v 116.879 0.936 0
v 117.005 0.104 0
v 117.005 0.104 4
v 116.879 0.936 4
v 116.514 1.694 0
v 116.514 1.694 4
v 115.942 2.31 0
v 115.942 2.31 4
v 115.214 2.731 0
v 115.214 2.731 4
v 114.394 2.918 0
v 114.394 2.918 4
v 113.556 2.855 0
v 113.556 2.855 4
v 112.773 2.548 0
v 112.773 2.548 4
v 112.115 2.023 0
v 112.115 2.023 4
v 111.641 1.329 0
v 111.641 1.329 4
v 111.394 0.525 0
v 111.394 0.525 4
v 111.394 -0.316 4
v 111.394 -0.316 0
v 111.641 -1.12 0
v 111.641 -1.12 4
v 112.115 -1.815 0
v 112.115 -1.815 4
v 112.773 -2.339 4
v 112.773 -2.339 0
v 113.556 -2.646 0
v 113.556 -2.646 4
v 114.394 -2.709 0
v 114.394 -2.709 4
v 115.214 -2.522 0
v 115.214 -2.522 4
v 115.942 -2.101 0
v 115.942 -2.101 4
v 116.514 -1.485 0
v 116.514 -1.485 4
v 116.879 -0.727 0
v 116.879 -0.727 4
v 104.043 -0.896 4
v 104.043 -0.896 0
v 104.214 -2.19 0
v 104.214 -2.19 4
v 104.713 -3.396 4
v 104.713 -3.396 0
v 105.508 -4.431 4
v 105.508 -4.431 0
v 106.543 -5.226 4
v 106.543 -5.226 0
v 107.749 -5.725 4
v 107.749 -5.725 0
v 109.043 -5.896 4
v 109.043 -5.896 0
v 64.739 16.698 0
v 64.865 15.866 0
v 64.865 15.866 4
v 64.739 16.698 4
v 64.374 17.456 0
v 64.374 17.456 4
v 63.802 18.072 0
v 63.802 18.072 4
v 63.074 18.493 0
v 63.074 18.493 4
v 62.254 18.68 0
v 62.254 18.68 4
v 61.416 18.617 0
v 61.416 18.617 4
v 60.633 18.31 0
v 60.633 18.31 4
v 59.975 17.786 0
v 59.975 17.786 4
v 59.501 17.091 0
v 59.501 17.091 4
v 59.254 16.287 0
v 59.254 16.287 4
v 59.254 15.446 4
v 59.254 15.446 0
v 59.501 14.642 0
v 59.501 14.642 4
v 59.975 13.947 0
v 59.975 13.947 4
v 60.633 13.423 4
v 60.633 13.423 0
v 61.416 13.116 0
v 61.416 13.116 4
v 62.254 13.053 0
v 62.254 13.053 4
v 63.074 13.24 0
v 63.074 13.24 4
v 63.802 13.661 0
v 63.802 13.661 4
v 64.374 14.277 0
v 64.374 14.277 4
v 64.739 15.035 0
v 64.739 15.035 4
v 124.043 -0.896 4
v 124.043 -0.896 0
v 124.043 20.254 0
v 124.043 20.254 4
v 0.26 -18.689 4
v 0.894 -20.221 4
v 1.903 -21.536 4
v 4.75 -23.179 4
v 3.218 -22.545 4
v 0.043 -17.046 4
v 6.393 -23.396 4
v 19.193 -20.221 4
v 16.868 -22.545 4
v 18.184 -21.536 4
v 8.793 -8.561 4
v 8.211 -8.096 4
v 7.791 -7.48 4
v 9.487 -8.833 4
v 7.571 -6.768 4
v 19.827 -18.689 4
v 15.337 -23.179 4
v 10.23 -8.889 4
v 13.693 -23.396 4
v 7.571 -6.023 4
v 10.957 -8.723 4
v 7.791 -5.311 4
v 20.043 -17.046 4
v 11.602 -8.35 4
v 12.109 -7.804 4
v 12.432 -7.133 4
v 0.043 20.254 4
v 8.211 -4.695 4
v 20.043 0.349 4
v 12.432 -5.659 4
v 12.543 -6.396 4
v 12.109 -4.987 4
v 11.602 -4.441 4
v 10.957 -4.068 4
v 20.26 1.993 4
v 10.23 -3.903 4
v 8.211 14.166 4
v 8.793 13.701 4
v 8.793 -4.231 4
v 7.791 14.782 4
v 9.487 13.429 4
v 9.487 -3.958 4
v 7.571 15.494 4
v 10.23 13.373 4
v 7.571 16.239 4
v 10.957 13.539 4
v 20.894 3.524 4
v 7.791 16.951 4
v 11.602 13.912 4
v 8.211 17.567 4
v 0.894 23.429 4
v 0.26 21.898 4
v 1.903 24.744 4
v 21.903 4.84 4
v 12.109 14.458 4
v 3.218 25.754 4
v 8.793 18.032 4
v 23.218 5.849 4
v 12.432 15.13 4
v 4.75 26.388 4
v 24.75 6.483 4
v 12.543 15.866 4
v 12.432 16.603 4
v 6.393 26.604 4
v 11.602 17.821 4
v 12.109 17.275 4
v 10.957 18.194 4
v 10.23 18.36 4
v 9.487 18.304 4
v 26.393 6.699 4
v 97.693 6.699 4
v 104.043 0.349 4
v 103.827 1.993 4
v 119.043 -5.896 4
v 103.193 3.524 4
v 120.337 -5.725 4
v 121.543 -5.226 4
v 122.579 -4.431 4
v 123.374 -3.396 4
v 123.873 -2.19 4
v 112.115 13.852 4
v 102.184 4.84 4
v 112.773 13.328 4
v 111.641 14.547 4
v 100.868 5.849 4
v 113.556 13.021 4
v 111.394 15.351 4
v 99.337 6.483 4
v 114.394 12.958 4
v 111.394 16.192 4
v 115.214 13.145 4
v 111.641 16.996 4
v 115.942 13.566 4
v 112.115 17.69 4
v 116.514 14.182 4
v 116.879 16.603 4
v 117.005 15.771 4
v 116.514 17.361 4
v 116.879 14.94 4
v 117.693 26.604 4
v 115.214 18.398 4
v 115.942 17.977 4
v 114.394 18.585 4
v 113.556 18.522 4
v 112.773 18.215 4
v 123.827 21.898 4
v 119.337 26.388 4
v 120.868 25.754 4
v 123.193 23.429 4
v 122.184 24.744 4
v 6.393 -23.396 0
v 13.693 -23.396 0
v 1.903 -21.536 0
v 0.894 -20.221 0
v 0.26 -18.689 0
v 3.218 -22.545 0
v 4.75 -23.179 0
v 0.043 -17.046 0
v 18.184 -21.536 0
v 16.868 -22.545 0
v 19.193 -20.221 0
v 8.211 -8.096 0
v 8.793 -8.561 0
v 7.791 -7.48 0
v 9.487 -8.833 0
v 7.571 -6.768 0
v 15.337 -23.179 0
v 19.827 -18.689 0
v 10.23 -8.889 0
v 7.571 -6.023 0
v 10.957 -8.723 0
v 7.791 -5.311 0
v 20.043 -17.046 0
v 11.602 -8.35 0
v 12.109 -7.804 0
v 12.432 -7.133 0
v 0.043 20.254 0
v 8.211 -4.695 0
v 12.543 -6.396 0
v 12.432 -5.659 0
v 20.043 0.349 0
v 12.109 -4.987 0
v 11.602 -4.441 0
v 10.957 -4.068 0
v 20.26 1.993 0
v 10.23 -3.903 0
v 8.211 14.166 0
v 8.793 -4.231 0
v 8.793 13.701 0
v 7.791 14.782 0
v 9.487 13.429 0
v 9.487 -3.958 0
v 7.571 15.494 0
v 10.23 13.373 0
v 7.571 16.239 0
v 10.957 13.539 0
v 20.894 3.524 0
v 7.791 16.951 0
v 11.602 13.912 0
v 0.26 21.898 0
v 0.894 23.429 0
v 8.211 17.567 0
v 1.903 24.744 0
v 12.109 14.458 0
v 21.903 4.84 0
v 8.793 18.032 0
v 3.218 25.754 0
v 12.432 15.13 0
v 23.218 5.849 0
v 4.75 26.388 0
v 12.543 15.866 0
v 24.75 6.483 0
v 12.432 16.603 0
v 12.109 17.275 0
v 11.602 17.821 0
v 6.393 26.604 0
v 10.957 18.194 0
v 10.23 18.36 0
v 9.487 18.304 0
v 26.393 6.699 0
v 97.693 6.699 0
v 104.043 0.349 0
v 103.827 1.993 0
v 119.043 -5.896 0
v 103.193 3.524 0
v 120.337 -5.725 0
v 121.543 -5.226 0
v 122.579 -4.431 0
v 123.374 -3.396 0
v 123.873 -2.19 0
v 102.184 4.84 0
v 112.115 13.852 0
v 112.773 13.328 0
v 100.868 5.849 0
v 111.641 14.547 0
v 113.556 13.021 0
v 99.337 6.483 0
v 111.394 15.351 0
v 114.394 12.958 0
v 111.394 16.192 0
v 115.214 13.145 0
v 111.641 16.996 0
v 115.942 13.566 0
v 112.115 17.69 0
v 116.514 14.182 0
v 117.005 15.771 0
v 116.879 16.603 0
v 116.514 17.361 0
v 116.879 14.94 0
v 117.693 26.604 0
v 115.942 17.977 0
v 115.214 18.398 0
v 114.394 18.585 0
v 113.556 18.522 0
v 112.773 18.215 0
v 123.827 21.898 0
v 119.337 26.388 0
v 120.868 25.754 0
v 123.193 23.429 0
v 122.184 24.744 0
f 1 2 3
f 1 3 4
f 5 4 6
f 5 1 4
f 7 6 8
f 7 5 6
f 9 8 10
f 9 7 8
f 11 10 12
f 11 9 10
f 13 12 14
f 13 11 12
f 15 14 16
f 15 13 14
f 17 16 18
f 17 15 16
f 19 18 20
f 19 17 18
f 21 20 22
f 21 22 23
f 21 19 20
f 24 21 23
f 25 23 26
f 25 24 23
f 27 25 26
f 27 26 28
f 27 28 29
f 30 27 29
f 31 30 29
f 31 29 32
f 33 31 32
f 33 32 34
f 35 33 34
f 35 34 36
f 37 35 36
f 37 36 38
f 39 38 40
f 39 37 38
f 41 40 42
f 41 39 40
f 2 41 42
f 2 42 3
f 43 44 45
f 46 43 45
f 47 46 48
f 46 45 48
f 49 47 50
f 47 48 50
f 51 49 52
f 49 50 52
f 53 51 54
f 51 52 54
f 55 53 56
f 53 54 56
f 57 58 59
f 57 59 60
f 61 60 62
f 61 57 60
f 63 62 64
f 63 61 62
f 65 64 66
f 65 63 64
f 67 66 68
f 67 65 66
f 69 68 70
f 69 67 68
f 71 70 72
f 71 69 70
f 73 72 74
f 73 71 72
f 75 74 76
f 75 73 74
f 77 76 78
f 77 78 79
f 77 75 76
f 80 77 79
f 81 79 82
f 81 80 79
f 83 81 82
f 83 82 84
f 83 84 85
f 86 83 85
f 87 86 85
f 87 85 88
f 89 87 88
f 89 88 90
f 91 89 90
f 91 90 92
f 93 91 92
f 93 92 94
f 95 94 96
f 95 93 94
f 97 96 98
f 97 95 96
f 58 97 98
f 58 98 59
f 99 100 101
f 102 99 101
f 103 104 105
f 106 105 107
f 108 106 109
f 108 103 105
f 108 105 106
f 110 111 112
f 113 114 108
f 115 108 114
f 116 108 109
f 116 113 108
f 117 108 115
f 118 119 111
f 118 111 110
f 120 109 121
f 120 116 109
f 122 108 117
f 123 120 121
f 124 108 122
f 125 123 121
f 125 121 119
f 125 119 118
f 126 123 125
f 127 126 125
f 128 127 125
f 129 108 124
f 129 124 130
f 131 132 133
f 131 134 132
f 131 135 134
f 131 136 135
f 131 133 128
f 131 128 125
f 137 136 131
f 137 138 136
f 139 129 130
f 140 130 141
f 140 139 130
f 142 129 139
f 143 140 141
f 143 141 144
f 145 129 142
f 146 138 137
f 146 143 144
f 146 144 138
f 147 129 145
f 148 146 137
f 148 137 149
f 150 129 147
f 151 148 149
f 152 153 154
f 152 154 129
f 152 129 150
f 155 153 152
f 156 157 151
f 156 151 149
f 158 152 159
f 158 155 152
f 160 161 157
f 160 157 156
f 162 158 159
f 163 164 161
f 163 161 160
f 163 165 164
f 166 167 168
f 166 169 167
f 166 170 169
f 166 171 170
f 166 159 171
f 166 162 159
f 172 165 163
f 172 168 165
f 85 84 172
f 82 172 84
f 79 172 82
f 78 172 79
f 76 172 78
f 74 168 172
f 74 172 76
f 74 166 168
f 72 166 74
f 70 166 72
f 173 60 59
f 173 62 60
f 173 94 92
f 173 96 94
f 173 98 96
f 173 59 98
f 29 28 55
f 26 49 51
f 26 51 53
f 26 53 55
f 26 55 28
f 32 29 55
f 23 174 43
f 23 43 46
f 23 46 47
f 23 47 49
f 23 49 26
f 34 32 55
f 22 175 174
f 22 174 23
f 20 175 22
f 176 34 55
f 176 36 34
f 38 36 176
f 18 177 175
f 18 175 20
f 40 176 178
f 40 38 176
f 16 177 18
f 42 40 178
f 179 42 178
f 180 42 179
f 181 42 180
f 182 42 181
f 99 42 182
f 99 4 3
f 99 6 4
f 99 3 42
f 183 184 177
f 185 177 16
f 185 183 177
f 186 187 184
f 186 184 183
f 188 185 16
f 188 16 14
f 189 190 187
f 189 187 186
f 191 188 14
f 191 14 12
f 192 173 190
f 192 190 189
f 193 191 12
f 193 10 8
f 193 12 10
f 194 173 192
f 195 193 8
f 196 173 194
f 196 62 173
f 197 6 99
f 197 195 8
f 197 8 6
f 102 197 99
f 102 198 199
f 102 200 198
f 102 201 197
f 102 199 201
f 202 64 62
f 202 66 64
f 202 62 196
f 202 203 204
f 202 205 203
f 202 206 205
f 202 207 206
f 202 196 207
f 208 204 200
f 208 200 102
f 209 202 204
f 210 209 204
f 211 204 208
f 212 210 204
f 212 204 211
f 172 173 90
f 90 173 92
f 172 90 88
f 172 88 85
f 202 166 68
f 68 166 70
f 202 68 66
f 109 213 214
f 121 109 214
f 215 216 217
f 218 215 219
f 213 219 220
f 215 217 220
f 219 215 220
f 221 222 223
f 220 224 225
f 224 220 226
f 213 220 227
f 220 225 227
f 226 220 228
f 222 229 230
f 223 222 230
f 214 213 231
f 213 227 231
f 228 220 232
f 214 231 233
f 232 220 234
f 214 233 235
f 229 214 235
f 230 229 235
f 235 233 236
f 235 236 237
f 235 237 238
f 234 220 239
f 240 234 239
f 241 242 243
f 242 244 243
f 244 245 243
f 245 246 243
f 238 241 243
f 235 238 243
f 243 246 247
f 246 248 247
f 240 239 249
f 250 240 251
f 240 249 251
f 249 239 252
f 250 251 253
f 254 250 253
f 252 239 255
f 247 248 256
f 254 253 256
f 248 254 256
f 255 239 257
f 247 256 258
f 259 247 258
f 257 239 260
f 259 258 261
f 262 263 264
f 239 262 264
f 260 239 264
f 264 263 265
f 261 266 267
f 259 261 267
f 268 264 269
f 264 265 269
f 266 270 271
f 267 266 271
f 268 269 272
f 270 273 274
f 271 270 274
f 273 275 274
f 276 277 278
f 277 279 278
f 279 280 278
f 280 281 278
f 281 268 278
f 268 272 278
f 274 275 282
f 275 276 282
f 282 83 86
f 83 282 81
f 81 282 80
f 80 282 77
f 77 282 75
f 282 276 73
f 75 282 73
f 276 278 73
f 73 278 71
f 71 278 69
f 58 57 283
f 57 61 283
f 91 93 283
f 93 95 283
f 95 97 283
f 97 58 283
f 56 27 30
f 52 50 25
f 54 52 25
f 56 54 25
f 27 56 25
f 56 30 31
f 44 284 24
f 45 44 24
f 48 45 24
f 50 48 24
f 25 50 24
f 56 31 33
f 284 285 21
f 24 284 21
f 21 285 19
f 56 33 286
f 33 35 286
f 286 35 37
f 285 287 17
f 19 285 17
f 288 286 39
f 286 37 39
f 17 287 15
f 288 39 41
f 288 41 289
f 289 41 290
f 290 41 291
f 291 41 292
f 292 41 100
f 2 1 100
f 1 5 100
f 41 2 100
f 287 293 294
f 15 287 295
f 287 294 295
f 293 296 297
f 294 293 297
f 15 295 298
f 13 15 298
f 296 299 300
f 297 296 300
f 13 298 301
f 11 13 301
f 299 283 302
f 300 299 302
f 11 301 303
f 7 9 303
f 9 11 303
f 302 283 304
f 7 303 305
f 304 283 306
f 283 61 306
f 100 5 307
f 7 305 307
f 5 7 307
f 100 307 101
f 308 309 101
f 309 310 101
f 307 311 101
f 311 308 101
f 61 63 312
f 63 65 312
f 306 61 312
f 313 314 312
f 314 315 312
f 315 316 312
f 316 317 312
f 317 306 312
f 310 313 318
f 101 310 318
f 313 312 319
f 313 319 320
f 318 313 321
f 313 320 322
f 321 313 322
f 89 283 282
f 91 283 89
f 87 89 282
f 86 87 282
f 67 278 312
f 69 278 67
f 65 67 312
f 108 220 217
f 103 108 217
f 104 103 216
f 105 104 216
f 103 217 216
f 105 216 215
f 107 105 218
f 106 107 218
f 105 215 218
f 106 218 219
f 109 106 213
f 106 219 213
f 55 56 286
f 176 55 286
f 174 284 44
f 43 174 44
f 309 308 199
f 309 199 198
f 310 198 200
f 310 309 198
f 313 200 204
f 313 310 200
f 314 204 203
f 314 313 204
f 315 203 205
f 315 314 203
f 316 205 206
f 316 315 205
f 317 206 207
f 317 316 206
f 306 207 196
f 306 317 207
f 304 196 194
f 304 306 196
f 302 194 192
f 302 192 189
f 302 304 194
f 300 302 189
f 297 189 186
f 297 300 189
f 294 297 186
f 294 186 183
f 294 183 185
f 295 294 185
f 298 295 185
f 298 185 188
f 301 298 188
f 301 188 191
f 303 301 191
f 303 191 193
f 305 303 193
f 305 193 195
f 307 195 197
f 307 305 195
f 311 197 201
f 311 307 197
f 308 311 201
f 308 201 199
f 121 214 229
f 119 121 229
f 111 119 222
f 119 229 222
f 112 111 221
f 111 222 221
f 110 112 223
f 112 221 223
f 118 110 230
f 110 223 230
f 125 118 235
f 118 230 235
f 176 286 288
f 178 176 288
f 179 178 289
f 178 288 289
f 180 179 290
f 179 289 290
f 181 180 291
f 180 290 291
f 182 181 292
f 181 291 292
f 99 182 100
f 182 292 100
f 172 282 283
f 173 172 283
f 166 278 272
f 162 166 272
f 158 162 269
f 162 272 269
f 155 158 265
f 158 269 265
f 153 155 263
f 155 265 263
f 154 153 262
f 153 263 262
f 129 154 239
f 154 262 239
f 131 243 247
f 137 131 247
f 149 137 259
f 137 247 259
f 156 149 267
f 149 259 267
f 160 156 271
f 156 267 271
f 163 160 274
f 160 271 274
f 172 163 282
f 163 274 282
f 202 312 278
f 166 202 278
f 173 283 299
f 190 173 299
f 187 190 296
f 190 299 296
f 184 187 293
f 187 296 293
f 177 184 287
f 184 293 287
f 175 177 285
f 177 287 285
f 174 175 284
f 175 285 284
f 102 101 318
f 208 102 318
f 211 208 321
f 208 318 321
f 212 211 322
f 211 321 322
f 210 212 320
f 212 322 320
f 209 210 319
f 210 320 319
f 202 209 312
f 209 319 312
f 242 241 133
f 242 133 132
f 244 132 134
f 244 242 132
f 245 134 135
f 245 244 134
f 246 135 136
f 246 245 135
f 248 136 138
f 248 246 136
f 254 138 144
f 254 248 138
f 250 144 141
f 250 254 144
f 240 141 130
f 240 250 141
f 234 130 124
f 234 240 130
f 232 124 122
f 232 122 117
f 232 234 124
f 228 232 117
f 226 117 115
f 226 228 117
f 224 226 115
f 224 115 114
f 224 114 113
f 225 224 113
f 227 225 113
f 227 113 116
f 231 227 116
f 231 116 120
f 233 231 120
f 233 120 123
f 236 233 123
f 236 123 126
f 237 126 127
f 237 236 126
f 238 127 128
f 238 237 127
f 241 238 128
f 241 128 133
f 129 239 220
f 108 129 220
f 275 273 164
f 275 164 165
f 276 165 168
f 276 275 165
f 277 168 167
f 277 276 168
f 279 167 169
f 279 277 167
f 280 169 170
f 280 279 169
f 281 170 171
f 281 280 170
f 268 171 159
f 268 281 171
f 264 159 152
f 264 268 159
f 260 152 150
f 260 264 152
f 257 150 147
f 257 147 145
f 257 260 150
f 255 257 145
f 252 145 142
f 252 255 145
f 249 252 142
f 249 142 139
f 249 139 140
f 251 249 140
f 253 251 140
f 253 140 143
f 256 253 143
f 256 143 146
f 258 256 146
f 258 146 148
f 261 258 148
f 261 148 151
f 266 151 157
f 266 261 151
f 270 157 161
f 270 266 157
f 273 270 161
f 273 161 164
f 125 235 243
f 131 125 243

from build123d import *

# Parameters (mm, degrees)
CROQUIS1_R              = 2.5
CROQUIS1_R_2            = 2.821368504
SALIENTE_EXTRUIR1_DEPTH = 4


with BuildPart() as part:
    # Croquis1 → Saliente-Extruir1 (new body)
    with BuildSketch(Plane.XY):
        with BuildLine():
            Line((26.393375205, 6.699416954), (97.693375205, 6.699416954))
            ThreePointArc((97.693375205, 6.699416954), (102.183503265, 4.839545014), (104.043375205, 0.349416954))
            Line((104.043375205, 0.349416954), (104.043375205, -0.895643676))
            ThreePointArc((104.043375205, -0.895643676), (105.507841299, -4.431177582), (109.043375205, -5.895643676))
            Line((109.043375205, -5.895643676), (119.043375205, -5.895643676))
            ThreePointArc((119.043375205, -5.895643676), (122.578909111, -4.431177582), (124.043375205, -0.895643676))
            Line((124.043375205, -0.895643676), (124.043375205, 6.604356324))
            Line((124.043375205, 6.604356324), (124.043375205, 20.254356324))
            ThreePointArc((124.043375205, 20.254356324), (122.183503265, 24.744484385), (117.693375205, 26.604356324))
            Line((117.693375205, 26.604356324), (6.393375205, 26.604356324))
            ThreePointArc((6.393375205, 26.604356324), (1.903247144, 24.744484385), (0.043375205, 20.254356324))
            Line((0.043375205, 20.254356324), (0.043375205, 6.604356324))
            Line((0.043375205, 6.604356324), (0.043375205, -17.045643676))
            ThreePointArc((0.043375205, -17.045643676), (1.903247144, -21.535771736), (6.393375205, -23.395643676))
            Line((6.393375205, -23.395643676), (13.693375205, -23.395643676))
            ThreePointArc((13.693375205, -23.395643676), (18.183503265, -21.535771736), (20.043375205, -17.045643676))
            Line((20.043375205, -17.045643676), (20.043375205, 0.349416954))
            ThreePointArc((20.043375205, 0.349416954), (21.903247144, 4.839545014), (26.393375205, 6.699416954))
        make_face()
        with Locations((10.043375205, 15.866498333)):
            Circle(CROQUIS1_R, mode=Mode.SUBTRACT)
        with Locations((114.183375205, 15.771437703)):
            Circle(CROQUIS1_R_2, mode=Mode.SUBTRACT)
        with Locations((10.043375205, -6.395643676)):
            Circle(CROQUIS1_R, mode=Mode.SUBTRACT)
        with Locations((62.043375205, 15.866498333)):
            Circle(CROQUIS1_R_2, mode=Mode.SUBTRACT)
        with Locations((114.183375205, 0.104356324)):
            Circle(CROQUIS1_R_2, mode=Mode.SUBTRACT)
    extrude(amount=SALIENTE_EXTRUIR1_DEPTH)


solid = part.part
